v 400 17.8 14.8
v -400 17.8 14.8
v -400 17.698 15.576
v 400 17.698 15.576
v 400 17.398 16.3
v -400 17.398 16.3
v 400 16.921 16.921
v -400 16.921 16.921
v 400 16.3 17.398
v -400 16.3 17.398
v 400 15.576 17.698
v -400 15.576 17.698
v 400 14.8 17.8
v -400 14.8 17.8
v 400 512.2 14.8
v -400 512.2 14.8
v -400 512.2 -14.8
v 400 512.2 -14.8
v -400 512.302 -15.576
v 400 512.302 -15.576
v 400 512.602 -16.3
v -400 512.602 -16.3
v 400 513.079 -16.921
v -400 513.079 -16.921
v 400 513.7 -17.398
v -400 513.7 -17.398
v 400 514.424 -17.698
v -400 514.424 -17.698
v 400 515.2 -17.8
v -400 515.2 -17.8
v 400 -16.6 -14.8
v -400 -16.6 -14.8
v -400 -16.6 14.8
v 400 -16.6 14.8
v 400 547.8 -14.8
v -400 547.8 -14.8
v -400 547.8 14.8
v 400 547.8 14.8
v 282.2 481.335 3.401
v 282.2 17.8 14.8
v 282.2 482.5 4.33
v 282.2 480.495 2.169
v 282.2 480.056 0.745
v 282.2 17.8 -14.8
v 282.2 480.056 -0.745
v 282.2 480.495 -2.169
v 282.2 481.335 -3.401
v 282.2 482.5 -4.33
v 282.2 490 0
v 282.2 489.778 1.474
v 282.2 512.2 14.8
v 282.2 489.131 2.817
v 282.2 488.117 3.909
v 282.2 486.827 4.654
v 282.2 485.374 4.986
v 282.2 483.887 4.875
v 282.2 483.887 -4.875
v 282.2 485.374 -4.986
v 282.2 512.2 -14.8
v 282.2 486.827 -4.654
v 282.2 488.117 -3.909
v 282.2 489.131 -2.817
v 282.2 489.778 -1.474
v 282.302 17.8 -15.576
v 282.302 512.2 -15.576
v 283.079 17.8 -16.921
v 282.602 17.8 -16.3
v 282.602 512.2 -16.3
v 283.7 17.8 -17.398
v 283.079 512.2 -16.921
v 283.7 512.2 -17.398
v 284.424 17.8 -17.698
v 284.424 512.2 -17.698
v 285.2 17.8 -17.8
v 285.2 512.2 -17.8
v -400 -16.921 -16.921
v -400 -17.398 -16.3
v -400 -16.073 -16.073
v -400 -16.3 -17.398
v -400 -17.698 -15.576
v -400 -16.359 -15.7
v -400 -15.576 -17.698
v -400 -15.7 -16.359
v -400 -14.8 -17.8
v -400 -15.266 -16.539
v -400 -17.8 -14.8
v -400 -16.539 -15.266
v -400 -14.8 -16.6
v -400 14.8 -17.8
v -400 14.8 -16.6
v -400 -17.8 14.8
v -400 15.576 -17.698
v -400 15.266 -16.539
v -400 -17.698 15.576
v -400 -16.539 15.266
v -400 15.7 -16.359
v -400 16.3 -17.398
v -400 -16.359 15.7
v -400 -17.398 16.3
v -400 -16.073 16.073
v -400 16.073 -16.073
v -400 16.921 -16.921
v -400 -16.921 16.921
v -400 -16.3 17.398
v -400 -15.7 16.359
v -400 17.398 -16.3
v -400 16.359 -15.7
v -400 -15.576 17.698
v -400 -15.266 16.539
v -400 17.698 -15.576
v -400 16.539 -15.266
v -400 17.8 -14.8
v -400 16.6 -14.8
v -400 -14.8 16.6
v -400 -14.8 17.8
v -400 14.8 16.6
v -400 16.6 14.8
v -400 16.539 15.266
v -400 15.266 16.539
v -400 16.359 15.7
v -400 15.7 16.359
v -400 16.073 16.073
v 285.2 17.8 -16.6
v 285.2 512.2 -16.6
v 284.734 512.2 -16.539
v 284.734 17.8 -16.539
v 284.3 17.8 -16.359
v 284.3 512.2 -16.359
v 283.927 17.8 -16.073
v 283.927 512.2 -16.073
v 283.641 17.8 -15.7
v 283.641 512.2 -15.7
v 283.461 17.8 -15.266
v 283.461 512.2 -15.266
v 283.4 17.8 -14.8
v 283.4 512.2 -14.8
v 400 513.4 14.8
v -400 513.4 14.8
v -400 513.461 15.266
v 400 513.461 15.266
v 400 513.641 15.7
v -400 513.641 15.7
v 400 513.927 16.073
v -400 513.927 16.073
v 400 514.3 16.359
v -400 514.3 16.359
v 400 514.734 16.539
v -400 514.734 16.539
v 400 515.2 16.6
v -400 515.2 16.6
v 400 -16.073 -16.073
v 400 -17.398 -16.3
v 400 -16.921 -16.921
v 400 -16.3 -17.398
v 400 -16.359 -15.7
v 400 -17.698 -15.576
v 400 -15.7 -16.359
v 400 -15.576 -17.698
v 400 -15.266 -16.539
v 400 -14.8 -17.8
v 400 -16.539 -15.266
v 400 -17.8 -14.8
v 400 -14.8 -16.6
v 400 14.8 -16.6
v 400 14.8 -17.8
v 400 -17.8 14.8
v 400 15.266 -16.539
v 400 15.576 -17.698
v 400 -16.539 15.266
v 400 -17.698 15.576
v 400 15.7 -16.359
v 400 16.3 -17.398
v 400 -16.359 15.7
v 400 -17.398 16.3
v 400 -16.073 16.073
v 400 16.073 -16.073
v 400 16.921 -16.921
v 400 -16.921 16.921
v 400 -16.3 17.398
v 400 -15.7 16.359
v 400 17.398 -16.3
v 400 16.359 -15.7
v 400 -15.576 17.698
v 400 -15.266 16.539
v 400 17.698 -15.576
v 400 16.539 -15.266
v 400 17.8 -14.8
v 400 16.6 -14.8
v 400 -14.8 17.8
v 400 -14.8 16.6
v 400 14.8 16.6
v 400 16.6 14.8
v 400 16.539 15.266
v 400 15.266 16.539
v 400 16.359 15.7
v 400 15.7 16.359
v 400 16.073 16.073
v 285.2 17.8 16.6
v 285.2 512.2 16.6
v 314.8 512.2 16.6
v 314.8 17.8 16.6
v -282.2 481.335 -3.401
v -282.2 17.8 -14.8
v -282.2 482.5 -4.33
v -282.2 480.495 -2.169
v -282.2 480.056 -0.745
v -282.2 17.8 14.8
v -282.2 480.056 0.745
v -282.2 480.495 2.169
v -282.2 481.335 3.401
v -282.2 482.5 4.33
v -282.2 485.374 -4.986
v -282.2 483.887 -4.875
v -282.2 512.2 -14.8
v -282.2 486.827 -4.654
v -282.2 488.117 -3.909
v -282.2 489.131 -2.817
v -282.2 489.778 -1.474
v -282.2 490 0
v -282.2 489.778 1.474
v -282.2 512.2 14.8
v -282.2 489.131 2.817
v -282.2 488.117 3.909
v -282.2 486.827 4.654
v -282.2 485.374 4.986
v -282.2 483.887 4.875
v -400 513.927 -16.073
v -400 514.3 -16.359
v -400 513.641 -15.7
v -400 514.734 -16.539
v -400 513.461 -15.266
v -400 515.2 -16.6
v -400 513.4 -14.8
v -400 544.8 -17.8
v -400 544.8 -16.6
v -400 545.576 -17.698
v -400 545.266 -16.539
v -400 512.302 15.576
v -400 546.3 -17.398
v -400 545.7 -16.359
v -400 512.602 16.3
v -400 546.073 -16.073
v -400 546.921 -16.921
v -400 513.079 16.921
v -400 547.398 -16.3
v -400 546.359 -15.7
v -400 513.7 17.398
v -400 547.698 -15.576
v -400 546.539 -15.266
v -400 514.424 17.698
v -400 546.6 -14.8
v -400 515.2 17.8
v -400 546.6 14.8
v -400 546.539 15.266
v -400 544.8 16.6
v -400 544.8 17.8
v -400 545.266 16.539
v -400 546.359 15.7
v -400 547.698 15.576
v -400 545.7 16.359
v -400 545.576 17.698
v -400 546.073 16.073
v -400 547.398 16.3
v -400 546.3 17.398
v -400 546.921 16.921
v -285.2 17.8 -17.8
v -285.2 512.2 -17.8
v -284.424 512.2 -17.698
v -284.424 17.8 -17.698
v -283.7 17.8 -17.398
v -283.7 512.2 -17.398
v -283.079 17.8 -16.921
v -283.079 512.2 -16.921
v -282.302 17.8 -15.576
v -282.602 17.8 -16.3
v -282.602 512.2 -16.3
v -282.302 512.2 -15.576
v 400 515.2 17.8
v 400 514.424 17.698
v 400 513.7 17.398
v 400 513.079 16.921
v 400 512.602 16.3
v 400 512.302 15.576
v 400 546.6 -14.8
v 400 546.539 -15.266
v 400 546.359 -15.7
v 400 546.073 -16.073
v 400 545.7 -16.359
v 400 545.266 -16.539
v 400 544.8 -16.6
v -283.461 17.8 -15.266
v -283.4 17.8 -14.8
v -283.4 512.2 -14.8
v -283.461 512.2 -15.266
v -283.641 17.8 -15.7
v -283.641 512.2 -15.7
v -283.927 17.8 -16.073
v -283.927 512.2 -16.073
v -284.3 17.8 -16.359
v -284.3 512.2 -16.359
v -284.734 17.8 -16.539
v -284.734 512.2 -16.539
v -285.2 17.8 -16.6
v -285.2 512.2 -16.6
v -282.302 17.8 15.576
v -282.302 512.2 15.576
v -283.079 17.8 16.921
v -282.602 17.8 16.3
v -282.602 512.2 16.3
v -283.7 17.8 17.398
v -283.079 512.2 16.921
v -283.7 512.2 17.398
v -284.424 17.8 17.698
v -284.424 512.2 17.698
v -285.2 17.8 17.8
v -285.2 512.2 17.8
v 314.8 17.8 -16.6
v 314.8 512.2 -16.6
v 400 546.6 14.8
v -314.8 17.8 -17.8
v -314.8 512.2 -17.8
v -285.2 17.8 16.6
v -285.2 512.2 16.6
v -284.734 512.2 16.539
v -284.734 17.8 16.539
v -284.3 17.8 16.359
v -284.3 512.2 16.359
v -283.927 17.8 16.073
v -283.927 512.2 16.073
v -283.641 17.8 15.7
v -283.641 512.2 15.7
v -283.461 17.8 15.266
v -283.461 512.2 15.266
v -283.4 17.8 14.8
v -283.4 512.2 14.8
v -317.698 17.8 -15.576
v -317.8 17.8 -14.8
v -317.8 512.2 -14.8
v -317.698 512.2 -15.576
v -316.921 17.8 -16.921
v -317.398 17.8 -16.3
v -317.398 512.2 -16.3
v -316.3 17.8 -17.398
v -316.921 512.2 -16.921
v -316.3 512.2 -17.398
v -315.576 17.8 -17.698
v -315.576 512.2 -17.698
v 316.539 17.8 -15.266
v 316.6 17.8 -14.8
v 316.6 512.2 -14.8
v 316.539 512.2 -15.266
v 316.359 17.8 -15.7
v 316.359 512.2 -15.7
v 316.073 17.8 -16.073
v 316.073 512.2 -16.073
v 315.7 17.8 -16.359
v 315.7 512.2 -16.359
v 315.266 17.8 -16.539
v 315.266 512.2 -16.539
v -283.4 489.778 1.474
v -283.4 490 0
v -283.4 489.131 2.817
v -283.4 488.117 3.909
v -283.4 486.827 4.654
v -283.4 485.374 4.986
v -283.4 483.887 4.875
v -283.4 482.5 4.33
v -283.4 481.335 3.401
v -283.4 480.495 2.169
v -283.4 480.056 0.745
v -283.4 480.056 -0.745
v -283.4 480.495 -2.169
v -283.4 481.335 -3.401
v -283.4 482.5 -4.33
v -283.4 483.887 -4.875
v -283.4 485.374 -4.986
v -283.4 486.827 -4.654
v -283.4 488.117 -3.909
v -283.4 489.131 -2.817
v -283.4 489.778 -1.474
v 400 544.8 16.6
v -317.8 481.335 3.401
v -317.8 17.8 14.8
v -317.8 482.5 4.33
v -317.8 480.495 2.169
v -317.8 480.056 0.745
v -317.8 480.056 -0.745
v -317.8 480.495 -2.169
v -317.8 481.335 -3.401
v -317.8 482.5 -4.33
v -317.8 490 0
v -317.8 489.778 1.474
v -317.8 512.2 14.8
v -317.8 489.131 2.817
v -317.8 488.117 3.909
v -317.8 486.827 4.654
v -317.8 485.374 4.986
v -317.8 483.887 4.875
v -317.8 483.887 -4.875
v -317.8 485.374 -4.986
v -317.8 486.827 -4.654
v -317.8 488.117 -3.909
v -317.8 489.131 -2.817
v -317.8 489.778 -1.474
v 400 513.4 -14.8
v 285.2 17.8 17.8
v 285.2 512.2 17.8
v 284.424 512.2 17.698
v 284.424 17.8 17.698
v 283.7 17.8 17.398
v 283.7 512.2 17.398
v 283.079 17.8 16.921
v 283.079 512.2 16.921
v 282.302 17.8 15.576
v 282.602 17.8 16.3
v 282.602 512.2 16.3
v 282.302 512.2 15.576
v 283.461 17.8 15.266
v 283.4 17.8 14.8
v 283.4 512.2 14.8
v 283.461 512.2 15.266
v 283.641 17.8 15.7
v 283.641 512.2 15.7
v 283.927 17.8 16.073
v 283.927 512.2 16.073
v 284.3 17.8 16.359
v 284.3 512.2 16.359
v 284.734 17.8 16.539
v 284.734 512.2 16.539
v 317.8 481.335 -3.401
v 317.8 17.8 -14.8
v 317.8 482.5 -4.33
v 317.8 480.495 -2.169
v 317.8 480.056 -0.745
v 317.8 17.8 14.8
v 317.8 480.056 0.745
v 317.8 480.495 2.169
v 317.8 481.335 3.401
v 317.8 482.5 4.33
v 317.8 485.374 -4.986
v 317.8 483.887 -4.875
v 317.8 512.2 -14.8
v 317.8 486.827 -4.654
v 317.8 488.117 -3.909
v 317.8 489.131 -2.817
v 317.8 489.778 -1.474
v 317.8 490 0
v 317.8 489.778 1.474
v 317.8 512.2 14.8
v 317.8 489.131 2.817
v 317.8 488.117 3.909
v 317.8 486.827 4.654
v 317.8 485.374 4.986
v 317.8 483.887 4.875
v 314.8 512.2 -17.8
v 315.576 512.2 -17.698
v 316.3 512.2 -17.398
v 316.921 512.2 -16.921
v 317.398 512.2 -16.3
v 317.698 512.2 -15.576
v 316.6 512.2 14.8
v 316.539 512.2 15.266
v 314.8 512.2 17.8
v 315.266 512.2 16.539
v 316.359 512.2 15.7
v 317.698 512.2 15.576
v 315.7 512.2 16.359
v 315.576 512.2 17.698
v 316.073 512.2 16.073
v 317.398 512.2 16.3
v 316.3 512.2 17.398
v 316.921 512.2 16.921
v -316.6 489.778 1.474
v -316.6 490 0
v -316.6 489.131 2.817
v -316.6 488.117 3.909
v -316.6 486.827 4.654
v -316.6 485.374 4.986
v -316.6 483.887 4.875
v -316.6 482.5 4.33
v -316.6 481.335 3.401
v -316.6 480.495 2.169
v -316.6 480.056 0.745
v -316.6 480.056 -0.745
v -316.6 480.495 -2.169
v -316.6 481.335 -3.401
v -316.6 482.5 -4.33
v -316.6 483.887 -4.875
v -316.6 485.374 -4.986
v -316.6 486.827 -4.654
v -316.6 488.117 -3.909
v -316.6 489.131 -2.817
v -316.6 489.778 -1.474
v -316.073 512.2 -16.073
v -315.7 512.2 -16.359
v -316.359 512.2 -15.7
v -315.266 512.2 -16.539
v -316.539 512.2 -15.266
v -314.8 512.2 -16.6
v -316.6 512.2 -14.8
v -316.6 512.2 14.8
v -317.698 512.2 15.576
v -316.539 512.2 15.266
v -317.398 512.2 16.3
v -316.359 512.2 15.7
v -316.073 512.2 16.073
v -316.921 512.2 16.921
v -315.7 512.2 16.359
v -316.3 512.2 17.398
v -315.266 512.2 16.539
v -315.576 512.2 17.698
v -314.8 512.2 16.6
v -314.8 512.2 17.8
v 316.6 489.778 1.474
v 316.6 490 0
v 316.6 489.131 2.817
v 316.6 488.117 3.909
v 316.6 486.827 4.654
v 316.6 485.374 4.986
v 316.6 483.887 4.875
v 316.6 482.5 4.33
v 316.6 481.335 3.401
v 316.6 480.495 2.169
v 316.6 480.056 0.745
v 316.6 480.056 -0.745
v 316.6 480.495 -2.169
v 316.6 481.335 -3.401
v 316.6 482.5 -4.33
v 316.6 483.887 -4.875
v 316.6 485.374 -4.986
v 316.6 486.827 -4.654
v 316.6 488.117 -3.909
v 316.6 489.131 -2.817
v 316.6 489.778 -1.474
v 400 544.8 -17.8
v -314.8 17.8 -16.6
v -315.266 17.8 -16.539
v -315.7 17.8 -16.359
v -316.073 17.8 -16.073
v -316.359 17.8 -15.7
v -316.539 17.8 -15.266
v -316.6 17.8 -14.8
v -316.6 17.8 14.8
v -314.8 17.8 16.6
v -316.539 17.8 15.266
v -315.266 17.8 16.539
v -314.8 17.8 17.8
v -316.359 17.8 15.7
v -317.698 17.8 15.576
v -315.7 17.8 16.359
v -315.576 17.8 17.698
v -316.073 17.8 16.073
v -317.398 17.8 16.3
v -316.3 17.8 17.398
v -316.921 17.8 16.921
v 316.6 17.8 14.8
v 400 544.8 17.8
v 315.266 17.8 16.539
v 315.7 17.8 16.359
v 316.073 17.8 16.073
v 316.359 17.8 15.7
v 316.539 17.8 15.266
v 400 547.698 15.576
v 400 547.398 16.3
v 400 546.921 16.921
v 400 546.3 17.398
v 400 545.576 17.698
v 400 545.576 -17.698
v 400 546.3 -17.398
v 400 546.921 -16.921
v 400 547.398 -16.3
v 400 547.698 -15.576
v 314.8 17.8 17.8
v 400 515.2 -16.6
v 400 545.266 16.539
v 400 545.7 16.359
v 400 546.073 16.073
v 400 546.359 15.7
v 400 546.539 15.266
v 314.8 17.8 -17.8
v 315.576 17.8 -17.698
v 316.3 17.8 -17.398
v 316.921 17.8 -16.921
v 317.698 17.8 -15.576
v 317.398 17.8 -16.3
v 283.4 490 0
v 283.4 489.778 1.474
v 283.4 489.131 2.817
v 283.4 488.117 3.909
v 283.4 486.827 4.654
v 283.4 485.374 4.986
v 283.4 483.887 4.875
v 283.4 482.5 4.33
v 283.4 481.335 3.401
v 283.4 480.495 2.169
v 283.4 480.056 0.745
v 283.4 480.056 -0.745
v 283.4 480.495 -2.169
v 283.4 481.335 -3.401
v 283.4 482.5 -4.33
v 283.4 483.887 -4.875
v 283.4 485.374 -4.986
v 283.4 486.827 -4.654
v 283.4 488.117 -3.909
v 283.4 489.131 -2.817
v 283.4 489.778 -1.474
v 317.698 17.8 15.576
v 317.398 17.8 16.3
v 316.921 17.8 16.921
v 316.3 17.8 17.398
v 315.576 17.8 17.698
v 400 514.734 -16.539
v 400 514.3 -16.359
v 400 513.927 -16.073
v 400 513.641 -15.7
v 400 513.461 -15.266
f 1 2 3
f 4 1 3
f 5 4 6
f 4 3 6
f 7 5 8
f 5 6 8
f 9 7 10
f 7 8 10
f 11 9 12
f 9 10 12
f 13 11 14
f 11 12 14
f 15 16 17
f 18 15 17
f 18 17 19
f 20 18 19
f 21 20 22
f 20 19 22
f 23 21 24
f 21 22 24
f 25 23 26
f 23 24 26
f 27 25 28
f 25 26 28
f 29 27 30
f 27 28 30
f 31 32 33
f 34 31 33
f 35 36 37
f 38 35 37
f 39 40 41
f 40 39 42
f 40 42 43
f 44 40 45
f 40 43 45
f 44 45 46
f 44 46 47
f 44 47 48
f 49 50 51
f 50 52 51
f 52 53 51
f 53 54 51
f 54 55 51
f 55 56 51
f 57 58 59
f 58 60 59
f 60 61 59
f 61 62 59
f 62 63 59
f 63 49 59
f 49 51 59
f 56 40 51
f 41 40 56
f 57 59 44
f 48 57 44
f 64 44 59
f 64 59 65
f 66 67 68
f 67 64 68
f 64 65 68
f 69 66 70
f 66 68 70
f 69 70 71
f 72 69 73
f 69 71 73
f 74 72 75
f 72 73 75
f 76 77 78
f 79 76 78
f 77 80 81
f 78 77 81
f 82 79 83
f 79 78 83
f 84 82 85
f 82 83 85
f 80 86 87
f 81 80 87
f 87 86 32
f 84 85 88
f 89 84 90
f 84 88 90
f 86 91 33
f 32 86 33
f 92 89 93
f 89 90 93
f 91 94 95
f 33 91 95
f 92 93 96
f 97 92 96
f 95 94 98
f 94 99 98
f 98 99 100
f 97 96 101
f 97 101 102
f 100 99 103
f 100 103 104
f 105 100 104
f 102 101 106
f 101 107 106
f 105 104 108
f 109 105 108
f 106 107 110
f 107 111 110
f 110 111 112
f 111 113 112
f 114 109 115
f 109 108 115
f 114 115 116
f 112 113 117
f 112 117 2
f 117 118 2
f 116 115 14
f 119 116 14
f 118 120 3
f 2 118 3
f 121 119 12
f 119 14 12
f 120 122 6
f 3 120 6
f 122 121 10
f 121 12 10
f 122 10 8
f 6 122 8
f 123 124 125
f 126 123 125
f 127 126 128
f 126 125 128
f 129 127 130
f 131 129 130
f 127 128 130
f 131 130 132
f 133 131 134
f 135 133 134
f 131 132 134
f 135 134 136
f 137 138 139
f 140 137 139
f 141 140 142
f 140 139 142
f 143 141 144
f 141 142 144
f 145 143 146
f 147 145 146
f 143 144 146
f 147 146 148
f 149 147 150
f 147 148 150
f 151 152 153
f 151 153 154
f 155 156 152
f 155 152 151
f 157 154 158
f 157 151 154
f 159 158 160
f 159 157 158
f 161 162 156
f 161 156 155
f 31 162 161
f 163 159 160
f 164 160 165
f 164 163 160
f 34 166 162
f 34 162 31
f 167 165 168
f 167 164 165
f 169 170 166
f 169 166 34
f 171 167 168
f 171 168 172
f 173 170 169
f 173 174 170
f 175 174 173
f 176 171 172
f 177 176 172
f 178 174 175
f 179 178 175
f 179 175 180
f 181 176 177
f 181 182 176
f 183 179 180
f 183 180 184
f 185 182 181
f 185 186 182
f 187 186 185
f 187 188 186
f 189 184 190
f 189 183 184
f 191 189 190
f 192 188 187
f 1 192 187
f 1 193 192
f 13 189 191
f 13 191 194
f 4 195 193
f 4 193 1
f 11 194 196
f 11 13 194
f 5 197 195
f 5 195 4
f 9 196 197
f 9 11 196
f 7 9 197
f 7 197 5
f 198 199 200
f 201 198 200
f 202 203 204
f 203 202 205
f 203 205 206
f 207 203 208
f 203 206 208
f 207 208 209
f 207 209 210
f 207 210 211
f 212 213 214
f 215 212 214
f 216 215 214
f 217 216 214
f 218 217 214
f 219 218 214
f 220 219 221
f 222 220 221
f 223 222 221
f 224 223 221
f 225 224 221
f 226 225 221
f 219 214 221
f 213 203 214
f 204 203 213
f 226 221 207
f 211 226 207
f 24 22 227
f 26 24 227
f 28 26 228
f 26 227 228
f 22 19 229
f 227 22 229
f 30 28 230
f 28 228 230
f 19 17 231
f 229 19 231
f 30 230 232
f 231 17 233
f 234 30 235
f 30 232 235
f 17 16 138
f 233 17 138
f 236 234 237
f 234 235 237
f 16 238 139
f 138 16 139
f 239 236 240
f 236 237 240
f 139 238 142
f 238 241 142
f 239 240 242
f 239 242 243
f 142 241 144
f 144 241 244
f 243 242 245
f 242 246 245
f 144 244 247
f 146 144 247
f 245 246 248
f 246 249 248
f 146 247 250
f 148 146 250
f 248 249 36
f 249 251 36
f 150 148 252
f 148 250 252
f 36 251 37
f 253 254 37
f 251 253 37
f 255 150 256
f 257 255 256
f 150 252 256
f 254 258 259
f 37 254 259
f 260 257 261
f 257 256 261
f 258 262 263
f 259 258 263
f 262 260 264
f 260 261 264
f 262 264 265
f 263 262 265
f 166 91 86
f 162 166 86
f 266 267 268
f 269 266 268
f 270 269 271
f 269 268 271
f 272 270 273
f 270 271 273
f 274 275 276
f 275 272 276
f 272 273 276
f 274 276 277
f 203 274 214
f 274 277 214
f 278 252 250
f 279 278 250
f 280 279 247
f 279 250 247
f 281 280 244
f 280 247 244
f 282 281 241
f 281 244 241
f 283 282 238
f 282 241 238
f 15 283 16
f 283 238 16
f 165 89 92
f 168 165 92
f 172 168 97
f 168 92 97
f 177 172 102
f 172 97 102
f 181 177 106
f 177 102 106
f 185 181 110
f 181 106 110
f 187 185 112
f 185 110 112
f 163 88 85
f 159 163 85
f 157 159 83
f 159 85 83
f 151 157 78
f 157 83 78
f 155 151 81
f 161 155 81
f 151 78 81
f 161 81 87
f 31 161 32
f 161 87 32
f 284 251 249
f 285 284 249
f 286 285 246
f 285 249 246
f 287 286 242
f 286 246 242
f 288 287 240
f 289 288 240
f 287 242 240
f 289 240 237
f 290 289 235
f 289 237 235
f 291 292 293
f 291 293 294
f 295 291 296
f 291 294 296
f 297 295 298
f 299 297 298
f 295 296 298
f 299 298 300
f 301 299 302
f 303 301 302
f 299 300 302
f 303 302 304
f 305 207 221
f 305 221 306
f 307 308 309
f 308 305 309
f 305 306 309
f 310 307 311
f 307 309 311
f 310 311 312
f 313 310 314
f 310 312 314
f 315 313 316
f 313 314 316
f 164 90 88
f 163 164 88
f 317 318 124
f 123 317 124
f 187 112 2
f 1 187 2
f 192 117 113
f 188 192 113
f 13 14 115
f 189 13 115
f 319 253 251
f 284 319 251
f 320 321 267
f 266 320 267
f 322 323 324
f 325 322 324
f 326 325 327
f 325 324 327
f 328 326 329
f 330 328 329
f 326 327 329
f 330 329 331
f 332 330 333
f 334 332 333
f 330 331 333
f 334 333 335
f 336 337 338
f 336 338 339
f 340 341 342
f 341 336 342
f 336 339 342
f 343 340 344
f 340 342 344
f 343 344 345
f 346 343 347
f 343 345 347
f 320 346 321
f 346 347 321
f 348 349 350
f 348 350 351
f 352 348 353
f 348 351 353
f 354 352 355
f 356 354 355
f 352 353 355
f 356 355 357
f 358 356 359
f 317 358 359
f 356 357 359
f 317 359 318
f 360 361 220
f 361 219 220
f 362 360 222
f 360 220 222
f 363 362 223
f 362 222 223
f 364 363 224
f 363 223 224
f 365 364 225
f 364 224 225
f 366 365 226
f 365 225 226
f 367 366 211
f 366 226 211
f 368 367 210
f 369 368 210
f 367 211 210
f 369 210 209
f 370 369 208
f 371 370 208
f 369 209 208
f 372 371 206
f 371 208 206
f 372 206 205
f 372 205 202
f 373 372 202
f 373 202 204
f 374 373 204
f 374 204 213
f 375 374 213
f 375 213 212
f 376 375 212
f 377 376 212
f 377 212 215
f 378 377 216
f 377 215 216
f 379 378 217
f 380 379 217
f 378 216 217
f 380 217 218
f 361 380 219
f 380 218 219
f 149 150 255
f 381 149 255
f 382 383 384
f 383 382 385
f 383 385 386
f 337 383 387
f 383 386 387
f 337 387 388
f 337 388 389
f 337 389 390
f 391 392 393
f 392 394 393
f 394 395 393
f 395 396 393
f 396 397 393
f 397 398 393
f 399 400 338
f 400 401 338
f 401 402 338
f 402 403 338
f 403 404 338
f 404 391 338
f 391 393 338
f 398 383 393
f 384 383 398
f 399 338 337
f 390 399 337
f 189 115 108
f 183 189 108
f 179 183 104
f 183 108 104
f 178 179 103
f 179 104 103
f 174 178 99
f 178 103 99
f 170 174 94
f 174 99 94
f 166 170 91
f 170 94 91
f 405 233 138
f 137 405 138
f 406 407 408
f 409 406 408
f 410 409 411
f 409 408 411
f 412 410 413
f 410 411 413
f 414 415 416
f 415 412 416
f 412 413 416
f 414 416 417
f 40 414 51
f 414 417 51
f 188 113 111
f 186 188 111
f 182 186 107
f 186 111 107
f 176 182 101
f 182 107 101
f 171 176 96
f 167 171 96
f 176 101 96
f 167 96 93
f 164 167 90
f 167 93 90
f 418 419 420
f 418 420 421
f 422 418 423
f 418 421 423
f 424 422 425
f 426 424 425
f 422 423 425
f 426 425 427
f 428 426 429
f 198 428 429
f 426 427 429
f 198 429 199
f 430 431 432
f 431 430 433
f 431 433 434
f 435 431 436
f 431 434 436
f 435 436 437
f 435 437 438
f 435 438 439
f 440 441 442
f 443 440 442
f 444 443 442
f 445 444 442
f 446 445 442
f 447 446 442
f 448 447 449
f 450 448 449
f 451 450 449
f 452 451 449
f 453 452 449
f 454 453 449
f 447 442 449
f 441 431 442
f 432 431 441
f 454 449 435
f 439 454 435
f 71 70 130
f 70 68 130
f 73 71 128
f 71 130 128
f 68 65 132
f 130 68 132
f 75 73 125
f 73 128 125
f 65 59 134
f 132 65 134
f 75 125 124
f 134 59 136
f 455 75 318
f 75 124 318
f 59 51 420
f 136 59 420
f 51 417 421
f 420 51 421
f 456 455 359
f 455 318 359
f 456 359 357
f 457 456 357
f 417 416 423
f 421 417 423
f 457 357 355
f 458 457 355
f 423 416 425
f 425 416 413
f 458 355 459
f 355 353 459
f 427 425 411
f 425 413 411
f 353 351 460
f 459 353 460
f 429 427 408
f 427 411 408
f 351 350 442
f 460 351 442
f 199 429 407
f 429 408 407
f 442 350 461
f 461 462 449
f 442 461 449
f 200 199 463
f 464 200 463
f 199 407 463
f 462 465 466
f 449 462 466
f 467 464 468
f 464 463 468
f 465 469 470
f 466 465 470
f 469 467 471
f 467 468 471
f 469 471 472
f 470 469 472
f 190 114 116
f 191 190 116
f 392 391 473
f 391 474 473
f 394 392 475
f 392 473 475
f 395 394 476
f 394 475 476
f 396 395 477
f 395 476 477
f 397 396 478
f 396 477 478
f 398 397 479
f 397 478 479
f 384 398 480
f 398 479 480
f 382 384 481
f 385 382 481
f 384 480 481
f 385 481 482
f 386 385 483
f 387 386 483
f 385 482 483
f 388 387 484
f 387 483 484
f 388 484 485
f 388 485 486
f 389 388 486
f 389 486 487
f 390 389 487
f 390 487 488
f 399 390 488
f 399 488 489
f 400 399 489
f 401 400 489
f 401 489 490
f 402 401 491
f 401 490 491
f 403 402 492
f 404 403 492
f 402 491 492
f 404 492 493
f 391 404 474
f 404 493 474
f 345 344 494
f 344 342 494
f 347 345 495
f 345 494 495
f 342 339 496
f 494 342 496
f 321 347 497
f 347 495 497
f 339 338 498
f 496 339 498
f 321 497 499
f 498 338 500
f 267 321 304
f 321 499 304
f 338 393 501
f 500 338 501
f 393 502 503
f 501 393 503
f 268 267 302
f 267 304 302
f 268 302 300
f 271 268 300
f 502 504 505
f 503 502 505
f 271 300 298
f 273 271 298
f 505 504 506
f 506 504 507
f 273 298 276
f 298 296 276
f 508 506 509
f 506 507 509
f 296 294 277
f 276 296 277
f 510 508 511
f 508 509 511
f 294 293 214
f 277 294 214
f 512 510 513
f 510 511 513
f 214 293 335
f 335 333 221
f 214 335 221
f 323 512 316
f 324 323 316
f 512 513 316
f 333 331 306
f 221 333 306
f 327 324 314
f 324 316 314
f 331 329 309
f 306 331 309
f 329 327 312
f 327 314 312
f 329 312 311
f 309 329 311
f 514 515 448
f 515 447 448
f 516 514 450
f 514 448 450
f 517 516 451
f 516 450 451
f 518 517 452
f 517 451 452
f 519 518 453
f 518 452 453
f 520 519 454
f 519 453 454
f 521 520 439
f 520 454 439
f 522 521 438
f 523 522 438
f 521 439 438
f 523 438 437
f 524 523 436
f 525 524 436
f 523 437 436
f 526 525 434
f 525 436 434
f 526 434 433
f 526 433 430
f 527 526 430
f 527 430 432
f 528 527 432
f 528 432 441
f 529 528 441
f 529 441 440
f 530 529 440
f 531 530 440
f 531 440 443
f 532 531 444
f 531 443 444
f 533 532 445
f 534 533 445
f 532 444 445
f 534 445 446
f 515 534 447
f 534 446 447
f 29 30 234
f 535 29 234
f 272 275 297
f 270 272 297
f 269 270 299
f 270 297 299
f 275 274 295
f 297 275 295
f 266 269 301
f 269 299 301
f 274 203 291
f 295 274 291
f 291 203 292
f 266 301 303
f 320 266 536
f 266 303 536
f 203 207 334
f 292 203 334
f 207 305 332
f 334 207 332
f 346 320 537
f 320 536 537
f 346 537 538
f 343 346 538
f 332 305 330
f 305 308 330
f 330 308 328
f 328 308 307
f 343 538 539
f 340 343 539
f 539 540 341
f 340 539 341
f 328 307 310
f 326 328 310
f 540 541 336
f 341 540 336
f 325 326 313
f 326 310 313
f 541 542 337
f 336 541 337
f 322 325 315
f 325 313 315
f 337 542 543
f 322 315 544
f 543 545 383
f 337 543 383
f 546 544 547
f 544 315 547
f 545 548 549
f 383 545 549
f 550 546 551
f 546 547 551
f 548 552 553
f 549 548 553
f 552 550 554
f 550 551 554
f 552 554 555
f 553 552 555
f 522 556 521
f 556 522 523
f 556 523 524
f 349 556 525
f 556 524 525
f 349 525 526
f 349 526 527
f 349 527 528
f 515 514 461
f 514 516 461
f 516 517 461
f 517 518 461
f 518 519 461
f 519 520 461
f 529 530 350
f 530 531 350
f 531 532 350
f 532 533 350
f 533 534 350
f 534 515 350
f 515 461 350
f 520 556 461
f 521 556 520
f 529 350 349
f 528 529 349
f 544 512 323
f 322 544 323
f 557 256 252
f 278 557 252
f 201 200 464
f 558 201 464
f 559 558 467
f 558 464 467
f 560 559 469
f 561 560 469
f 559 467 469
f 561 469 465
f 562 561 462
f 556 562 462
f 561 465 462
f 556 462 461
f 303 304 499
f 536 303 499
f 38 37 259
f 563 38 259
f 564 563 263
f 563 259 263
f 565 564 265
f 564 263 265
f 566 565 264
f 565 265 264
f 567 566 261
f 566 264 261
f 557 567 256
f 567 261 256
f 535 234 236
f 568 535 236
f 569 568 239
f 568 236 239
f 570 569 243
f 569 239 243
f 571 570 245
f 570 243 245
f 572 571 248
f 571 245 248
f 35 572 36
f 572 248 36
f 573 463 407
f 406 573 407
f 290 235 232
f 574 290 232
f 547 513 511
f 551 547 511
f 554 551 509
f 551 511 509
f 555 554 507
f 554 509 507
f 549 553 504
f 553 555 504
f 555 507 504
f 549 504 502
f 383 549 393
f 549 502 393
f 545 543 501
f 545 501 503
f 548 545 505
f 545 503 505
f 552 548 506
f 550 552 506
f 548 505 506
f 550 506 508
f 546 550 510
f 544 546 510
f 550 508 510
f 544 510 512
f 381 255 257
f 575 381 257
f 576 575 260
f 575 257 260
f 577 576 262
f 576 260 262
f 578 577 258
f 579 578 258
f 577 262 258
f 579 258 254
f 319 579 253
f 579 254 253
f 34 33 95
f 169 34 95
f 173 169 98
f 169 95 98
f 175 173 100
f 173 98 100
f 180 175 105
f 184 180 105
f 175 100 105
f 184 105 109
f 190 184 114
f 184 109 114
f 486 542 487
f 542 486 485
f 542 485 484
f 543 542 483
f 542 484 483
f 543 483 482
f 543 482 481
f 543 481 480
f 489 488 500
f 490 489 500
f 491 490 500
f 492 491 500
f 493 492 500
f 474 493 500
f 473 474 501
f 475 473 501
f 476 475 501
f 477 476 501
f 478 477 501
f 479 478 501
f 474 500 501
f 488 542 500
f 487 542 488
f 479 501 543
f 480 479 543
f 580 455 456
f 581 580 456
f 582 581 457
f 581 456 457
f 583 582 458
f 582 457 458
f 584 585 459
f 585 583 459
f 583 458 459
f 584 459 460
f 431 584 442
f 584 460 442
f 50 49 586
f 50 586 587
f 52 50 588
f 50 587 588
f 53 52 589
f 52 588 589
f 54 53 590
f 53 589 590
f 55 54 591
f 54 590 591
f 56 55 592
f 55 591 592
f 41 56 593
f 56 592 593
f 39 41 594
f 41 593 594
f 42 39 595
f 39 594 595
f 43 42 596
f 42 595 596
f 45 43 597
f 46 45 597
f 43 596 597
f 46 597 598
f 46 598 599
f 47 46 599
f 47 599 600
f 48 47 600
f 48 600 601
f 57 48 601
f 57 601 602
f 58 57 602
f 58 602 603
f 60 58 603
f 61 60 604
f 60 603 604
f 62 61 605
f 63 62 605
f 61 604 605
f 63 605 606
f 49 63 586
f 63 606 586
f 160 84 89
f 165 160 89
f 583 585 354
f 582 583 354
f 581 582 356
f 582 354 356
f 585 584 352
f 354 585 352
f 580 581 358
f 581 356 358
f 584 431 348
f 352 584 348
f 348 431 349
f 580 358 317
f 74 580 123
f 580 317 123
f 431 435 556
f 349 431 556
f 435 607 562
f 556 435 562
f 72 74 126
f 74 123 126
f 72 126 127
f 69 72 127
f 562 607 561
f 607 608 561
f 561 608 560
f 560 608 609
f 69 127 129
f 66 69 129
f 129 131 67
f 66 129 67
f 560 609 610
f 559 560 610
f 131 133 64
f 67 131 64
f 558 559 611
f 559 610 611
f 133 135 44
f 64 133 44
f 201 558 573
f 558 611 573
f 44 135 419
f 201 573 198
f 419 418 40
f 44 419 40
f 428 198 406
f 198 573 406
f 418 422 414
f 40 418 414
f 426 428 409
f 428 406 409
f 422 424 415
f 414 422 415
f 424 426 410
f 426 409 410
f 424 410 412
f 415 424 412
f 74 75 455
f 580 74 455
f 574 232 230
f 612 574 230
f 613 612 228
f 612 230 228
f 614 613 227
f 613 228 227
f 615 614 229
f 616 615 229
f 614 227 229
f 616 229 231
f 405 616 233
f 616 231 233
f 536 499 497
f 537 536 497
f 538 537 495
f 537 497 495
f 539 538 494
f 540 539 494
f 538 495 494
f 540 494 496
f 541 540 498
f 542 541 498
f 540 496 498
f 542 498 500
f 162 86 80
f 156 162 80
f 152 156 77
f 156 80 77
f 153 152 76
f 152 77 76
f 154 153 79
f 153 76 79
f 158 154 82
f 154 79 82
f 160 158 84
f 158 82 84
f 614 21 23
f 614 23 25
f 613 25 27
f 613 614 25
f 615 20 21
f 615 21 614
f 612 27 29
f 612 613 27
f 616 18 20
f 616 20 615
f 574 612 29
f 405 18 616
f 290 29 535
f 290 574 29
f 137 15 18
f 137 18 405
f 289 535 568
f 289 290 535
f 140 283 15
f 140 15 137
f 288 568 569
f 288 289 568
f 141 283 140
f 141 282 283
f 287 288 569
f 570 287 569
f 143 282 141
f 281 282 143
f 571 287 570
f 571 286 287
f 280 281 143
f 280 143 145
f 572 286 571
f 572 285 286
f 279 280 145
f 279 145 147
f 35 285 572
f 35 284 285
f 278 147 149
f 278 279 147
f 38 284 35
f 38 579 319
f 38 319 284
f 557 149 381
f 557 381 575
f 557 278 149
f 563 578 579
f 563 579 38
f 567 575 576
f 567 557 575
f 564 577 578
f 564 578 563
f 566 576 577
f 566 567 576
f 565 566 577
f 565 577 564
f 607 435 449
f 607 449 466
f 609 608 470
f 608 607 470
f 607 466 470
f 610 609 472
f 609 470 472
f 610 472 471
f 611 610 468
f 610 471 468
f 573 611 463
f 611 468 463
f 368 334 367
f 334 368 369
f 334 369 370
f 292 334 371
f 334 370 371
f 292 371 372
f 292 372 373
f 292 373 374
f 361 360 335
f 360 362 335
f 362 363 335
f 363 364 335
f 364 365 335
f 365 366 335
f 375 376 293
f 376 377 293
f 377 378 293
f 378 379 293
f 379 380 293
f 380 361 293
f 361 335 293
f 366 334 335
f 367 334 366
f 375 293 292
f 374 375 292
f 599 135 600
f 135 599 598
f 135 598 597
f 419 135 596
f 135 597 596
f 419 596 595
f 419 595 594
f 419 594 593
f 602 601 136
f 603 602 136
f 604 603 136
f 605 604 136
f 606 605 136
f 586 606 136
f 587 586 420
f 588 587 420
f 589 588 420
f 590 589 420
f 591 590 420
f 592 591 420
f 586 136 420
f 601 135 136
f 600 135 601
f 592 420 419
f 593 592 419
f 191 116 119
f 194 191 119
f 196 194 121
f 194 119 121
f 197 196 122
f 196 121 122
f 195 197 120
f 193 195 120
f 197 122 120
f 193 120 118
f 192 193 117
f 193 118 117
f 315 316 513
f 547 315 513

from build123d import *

# Parameters (mm, degrees)
STRUCTURAL_MEMBER1_DEPTH   = 800
STRUCTURAL_MEMBER1_2_DEPTH = 800
STRUCTURAL_MEMBER1_3_DEPTH = 532
STRUCTURAL_MEMBER1_4_DEPTH = 532
SKETCH12_R                 = 5
CUT_EXTRUDE1_DEPTH         = 679.529056121
CUT_EXTRUDE1_DEPTH_BACK    = 679.529056121


with BuildPart() as part:
    # Sketch11 → Structural Member1 (new body)
    with BuildSketch(Plane(origin=(-400, 530, 0), x_dir=(0, 1, 0), z_dir=(1, 0, 0))):
        with BuildLine():
            Line((-14.8, -17.8), (14.8, -17.8))
            ThreePointArc((14.8, -17.8), (16.921320344, -16.921320344), (17.8, -14.8))
            Line((17.8, -14.8), (17.8, 14.8))
            ThreePointArc((17.8, 14.8), (16.921320344, 16.921320344), (14.8, 17.8))
            Line((14.8, 17.8), (-14.8, 17.8))
            ThreePointArc((-14.8, 17.8), (-16.921320344, 16.921320344), (-17.8, 14.8))
            Line((-17.8, 14.8), (-17.8, -14.8))
            ThreePointArc((-17.8, -14.8), (-16.921320344, -16.921320344), (-14.8, -17.8))
        make_face()
        with BuildLine():
            Line((-14.8, 16.6), (14.8, 16.6))
            ThreePointArc((14.8, 16.6), (16.072792206, 16.072792206), (16.6, 14.8))
            Line((16.6, 14.8), (16.6, -14.8))
            ThreePointArc((16.6, -14.8), (16.072792206, -16.072792206), (14.8, -16.6))
            Line((14.8, -16.6), (-14.8, -16.6))
            ThreePointArc((-14.8, -16.6), (-16.072792206, -16.072792206), (-16.6, -14.8))
            Line((-16.6, -14.8), (-16.6, 14.8))
            ThreePointArc((-16.6, 14.8), (-16.072792206, 16.072792206), (-14.8, 16.6))
        make_face(mode=Mode.SUBTRACT)
    extrude(amount=STRUCTURAL_MEMBER1_DEPTH)


with BuildPart() as body_2:
    # Sketch11 on segment 2 (carried to segment 2) → Structural Member1 2 (new body)
    with BuildSketch(Plane.YZ.offset(-400)):
        with BuildLine():
            Line((-14.8, -17.8), (14.8, -17.8))
            ThreePointArc((14.8, -17.8), (16.921320344, -16.921320344), (17.8, -14.8))
            Line((17.8, -14.8), (17.8, 14.8))
            ThreePointArc((17.8, 14.8), (16.921320344, 16.921320344), (14.8, 17.8))
            Line((14.8, 17.8), (-14.8, 17.8))
            ThreePointArc((-14.8, 17.8), (-16.921320344, 16.921320344), (-17.8, 14.8))
            Line((-17.8, 14.8), (-17.8, -14.8))
            ThreePointArc((-17.8, -14.8), (-16.921320344, -16.921320344), (-14.8, -17.8))
        make_face()
        with BuildLine():
            Line((-14.8, 16.6), (14.8, 16.6))
            ThreePointArc((14.8, 16.6), (16.072792206, 16.072792206), (16.6, 14.8))
            Line((16.6, 14.8), (16.6, -14.8))
            ThreePointArc((16.6, -14.8), (16.072792206, -16.072792206), (14.8, -16.6))
            Line((14.8, -16.6), (-14.8, -16.6))
            ThreePointArc((-14.8, -16.6), (-16.072792206, -16.072792206), (-16.6, -14.8))
            Line((-16.6, -14.8), (-16.6, 14.8))
            ThreePointArc((-16.6, 14.8), (-16.072792206, 16.072792206), (-14.8, 16.6))
        make_face(mode=Mode.SUBTRACT)
    extrude(amount=STRUCTURAL_MEMBER1_2_DEPTH)


with BuildPart() as body_3:
    # Sketch11 on segment 3 (carried to segment 3) → Structural Member1 3 (new body)
    with BuildSketch(Plane(origin=(-300, 531, 0), x_dir=(1, 0, 0), z_dir=(0, -1, 0))):
        with BuildLine():
            Line((-14.8, -17.8), (14.8, -17.8))
            ThreePointArc((14.8, -17.8), (16.921320344, -16.921320344), (17.8, -14.8))
            Line((17.8, -14.8), (17.8, 14.8))
            ThreePointArc((17.8, 14.8), (16.921320344, 16.921320344), (14.8, 17.8))
            Line((14.8, 17.8), (-14.8, 17.8))
            ThreePointArc((-14.8, 17.8), (-16.921320344, 16.921320344), (-17.8, 14.8))
            Line((-17.8, 14.8), (-17.8, -14.8))
            ThreePointArc((-17.8, -14.8), (-16.921320344, -16.921320344), (-14.8, -17.8))
        make_face()
        with BuildLine():
            Line((-14.8, 16.6), (14.8, 16.6))
            ThreePointArc((14.8, 16.6), (16.072792206, 16.072792206), (16.6, 14.8))
            Line((16.6, 14.8), (16.6, -14.8))
            ThreePointArc((16.6, -14.8), (16.072792206, -16.072792206), (14.8, -16.6))
            Line((14.8, -16.6), (-14.8, -16.6))
            ThreePointArc((-14.8, -16.6), (-16.072792206, -16.072792206), (-16.6, -14.8))
            Line((-16.6, -14.8), (-16.6, 14.8))
            ThreePointArc((-16.6, 14.8), (-16.072792206, 16.072792206), (-14.8, 16.6))
        make_face(mode=Mode.SUBTRACT)
    extrude(amount=STRUCTURAL_MEMBER1_3_DEPTH)

    # Structural Member1 3 end butt 1
    split(bisect_by=Plane(origin=(-300, 512.2, 0), x_dir=(1, 0, 0), z_dir=(0, -1, 0)), keep=Keep.TOP)

    # Structural Member1 3 end butt 2
    split(bisect_by=Plane(origin=(-300, 17.8, 0), x_dir=(-1, 0, 0), z_dir=(0, 1, 0)), keep=Keep.TOP)


with BuildPart() as body_4:
    # Sketch11 on segment 4 (carried to segment 4) → Structural Member1 4 (new body)
    with BuildSketch(Plane(origin=(300, 531, 0), x_dir=(1, 0, 0), z_dir=(0, -1, 0))):
        with BuildLine():
            Line((-14.8, -17.8), (14.8, -17.8))
            ThreePointArc((14.8, -17.8), (16.921320344, -16.921320344), (17.8, -14.8))
            Line((17.8, -14.8), (17.8, 14.8))
            ThreePointArc((17.8, 14.8), (16.921320344, 16.921320344), (14.8, 17.8))
            Line((14.8, 17.8), (-14.8, 17.8))
            ThreePointArc((-14.8, 17.8), (-16.921320344, 16.921320344), (-17.8, 14.8))
            Line((-17.8, 14.8), (-17.8, -14.8))
            ThreePointArc((-17.8, -14.8), (-16.921320344, -16.921320344), (-14.8, -17.8))
        make_face()
        with BuildLine():
            Line((-14.8, 16.6), (14.8, 16.6))
            ThreePointArc((14.8, 16.6), (16.072792206, 16.072792206), (16.6, 14.8))
            Line((16.6, 14.8), (16.6, -14.8))
            ThreePointArc((16.6, -14.8), (16.072792206, -16.072792206), (14.8, -16.6))
            Line((14.8, -16.6), (-14.8, -16.6))
            ThreePointArc((-14.8, -16.6), (-16.072792206, -16.072792206), (-16.6, -14.8))
            Line((-16.6, -14.8), (-16.6, 14.8))
            ThreePointArc((-16.6, 14.8), (-16.072792206, 16.072792206), (-14.8, 16.6))
        make_face(mode=Mode.SUBTRACT)
    extrude(amount=STRUCTURAL_MEMBER1_4_DEPTH)

    # Structural Member1 4 end butt 1
    split(bisect_by=Plane(origin=(300, 512.2, 0), x_dir=(1, 0, 0), z_dir=(0, -1, 0)), keep=Keep.TOP)

    # Structural Member1 4 end butt 2
    split(bisect_by=Plane(origin=(300, 17.8, 0), x_dir=(-1, 0, 0), z_dir=(0, 1, 0)), keep=Keep.TOP)


with BuildPart() as cut_extrude1_tool:
    # Sketch12 → Cut-Extrude1 (new, two sides)
    with BuildSketch(Plane(origin=(0, 0, 0), x_dir=(0, 0, -1), z_dir=(1, 0, 0))) as cut_extrude1_sk:
        with Locations(Location((0, 485, 0), (0, 0, 90))):
            Circle(SKETCH12_R)
    extrude(amount=CUT_EXTRUDE1_DEPTH)
    extrude(cut_extrude1_sk.sketch, amount=-CUT_EXTRUDE1_DEPTH_BACK)


with BuildPart() as body_3_1:
    add(body_3.part)

    # Cut-Extrude1: cut by cut_extrude1_tool
    add(cut_extrude1_tool.part, mode=Mode.SUBTRACT)


with BuildPart() as body_4_1:
    add(body_4.part)

    # Cut-Extrude1: cut by cut_extrude1_tool
    add(cut_extrude1_tool.part, mode=Mode.SUBTRACT)


solid = Compound([part.part, body_2.part, body_3_1.part, body_4_1.part])
